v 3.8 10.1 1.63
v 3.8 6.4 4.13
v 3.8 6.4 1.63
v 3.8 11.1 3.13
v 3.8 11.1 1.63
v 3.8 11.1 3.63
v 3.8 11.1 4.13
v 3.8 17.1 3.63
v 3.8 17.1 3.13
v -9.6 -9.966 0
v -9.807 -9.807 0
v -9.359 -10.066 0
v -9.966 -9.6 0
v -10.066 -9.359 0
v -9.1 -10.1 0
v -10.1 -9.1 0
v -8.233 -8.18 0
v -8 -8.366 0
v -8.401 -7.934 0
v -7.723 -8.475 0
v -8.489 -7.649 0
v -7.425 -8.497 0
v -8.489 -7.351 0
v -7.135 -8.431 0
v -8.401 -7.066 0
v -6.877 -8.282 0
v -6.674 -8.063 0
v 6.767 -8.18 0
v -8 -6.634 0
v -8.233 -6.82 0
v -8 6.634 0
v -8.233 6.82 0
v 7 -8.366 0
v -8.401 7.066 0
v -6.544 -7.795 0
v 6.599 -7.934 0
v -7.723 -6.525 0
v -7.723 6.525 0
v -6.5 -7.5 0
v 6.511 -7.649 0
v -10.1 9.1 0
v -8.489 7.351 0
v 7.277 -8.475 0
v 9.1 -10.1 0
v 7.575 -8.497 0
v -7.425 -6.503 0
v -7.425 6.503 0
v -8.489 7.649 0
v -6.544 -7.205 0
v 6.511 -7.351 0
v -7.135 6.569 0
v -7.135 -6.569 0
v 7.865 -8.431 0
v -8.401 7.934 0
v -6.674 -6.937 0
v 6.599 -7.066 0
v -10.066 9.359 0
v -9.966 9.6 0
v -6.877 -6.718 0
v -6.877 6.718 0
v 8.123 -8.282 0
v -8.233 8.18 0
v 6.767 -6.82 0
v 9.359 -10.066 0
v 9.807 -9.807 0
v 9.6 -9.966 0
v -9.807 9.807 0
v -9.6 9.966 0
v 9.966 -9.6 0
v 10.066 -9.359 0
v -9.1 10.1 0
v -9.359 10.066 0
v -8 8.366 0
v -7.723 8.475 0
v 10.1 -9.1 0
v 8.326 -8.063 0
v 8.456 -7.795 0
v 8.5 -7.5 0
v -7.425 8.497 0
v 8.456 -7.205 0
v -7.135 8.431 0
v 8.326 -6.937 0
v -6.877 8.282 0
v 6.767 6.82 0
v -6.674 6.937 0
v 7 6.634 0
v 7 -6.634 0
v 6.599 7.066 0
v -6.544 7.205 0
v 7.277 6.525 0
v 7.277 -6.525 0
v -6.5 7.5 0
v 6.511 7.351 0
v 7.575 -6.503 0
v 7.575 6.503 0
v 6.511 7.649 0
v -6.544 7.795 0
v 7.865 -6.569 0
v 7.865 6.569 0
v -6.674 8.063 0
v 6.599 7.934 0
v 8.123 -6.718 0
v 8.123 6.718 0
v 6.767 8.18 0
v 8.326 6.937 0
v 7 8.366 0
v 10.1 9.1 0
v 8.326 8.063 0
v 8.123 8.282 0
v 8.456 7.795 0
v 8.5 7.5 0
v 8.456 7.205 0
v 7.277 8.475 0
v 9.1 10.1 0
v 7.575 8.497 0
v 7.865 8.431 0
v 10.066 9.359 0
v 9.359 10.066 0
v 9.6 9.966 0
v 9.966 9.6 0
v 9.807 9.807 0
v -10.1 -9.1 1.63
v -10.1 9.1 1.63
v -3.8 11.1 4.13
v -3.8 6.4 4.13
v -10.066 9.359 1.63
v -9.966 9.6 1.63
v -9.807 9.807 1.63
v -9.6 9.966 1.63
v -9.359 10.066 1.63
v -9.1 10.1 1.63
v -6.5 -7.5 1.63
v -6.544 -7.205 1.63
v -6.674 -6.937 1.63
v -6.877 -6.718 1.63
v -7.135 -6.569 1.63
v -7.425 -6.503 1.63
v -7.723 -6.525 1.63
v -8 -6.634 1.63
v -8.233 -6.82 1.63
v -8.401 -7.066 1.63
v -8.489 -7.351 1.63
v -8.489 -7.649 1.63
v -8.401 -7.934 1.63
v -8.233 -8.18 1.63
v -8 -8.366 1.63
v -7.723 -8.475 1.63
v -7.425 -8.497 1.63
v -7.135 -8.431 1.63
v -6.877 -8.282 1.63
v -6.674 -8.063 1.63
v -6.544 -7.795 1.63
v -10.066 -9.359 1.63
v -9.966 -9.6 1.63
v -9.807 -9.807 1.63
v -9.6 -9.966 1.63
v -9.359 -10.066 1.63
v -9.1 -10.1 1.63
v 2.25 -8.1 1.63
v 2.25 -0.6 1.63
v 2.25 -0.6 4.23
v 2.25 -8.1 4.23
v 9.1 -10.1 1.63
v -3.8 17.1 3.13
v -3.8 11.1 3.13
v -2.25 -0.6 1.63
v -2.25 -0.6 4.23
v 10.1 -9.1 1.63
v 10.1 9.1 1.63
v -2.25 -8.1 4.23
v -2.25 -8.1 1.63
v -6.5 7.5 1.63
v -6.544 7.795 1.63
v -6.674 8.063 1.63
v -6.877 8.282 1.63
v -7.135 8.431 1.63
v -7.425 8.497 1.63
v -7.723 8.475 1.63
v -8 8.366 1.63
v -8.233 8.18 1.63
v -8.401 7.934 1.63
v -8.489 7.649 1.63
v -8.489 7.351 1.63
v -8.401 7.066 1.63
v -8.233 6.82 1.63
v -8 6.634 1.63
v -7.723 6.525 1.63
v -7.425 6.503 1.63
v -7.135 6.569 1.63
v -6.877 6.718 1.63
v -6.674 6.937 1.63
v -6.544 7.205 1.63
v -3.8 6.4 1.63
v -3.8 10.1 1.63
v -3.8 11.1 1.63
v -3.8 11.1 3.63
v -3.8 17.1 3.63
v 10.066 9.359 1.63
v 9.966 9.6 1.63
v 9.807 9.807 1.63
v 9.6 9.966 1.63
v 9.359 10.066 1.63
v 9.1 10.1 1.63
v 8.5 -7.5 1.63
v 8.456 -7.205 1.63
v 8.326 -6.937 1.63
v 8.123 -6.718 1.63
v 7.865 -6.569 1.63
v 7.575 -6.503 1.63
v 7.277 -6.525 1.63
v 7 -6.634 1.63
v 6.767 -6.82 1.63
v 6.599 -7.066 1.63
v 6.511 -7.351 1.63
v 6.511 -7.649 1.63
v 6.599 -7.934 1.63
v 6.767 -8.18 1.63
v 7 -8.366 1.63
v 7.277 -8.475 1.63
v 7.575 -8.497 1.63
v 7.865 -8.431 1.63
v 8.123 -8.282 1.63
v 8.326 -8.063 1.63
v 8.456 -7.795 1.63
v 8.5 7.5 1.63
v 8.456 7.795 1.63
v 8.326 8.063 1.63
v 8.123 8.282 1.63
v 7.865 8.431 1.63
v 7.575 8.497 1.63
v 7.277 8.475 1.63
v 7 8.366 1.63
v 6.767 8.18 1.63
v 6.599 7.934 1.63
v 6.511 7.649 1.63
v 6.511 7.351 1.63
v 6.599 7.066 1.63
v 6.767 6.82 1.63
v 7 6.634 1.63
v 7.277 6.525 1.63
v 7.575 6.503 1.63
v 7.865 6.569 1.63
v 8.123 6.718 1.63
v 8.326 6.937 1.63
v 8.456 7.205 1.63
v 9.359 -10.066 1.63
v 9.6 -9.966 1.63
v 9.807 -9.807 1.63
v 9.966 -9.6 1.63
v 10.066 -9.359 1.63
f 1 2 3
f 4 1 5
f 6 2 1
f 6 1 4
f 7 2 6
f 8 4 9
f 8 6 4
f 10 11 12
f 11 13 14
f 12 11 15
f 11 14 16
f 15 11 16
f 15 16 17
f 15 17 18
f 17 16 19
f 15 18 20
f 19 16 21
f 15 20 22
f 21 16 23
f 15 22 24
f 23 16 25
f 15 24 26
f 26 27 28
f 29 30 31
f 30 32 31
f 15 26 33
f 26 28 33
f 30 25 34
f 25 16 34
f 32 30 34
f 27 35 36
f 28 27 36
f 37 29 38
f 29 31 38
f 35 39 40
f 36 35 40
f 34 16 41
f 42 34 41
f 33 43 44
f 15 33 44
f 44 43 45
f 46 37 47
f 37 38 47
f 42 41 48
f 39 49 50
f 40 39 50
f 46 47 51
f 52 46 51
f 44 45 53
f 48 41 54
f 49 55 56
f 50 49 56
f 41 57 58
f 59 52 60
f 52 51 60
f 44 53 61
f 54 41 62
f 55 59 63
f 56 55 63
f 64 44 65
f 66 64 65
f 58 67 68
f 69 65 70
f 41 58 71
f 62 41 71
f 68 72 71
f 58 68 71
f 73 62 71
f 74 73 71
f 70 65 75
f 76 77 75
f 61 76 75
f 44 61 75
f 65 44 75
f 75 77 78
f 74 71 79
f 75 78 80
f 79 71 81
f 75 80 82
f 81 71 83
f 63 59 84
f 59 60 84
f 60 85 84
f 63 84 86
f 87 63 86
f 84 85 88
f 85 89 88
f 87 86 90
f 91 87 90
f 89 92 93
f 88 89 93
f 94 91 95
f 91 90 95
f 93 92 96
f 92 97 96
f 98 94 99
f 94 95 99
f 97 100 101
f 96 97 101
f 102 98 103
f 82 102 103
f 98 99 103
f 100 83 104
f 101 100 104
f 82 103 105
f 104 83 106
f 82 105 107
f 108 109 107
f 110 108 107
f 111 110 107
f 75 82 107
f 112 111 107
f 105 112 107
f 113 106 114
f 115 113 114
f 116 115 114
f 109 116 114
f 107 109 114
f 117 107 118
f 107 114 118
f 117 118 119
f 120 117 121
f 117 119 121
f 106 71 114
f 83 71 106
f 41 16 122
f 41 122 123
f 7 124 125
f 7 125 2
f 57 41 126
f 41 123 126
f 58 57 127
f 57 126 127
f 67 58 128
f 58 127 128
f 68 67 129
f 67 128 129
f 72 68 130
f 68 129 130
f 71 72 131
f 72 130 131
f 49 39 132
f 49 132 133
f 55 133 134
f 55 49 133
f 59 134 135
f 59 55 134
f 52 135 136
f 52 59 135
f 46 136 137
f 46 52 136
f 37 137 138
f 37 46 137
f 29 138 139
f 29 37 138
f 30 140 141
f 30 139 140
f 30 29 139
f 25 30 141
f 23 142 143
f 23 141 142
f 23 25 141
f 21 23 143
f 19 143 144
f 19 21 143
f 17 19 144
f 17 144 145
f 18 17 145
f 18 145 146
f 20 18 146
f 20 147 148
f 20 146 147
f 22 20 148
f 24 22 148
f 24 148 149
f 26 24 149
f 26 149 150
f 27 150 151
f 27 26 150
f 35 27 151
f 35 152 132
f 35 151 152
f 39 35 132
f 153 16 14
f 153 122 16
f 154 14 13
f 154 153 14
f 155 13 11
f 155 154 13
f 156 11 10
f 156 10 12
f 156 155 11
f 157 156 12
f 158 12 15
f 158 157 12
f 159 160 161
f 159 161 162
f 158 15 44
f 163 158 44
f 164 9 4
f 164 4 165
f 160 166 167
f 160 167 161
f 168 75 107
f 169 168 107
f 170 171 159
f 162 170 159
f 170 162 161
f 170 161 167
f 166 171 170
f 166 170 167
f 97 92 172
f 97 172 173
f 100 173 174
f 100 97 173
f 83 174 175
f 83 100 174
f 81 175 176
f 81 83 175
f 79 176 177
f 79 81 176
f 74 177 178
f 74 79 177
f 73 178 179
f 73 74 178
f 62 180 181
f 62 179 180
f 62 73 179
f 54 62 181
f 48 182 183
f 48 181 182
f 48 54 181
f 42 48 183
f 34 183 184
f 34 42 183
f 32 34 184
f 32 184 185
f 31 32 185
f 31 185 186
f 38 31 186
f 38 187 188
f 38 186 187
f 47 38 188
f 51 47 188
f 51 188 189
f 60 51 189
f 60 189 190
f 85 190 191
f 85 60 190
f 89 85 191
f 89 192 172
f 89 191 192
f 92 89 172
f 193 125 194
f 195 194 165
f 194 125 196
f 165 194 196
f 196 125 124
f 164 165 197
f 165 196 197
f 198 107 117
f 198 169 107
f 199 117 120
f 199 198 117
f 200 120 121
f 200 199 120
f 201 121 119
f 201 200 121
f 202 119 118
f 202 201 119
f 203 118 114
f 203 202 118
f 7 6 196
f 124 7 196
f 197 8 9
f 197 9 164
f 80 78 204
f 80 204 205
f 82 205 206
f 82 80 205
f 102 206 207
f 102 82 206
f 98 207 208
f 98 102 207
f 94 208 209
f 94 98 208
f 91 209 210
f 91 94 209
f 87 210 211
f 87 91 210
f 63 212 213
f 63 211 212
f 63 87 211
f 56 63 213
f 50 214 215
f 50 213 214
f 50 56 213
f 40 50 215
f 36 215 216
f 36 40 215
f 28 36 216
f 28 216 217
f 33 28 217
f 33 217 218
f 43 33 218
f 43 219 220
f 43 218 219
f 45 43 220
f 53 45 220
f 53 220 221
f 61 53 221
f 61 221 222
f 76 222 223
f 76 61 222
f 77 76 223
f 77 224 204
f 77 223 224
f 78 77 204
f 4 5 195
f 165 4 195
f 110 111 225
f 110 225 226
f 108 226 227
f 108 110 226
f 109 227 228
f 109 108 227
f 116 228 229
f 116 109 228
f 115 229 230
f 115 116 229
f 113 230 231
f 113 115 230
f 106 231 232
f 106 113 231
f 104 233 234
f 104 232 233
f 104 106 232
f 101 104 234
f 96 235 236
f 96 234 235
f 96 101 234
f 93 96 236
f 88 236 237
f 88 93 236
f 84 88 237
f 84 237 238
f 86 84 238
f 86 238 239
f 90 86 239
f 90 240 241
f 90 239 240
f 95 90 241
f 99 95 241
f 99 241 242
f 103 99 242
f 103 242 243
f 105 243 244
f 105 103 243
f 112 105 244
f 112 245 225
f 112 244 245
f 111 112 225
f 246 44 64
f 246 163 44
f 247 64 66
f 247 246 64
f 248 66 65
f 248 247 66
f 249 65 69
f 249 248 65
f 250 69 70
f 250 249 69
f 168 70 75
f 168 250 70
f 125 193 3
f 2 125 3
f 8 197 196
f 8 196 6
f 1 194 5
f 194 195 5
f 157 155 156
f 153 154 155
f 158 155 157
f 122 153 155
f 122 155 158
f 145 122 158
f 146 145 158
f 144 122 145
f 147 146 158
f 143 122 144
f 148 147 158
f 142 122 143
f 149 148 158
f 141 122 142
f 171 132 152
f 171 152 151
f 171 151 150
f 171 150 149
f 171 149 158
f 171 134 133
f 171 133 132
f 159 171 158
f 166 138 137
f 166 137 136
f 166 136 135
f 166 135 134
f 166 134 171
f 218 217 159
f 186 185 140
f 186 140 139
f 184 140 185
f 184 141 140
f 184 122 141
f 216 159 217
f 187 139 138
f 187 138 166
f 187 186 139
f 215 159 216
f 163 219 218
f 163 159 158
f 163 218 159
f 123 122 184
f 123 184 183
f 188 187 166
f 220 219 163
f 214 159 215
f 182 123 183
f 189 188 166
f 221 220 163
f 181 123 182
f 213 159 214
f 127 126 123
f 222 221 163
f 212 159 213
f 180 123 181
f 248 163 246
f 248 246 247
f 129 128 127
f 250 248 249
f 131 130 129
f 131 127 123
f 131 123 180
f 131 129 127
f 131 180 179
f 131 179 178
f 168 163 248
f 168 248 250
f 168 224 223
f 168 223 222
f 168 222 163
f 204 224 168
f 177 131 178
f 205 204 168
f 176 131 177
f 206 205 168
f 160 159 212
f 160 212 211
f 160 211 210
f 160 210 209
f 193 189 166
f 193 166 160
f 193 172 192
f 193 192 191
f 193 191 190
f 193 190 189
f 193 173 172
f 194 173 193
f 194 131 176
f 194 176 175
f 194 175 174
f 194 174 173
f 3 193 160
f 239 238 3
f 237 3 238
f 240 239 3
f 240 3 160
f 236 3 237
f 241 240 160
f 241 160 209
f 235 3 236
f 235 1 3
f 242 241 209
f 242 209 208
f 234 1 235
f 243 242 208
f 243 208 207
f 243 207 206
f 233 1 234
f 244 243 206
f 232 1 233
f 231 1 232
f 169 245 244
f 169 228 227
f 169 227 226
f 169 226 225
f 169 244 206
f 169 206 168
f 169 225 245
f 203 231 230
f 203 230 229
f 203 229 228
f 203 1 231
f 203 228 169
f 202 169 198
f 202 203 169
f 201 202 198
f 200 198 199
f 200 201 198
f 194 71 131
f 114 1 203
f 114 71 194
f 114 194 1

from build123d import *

# Parameters (mm, degrees)
SKETCH_1_W               = 20.2
SKETCH_1_H               = 20.2
EXTRUDE_1_DEPTH          = 1.63
FILLET_1_R               = 1
CUT_EXTRUDE_1_DEPTH      = 5
CUT_EXTRUDE_1_DEPTH_BACK = 15.376261684
SKETCH_2_R               = 1
EXTRUDE_2_DEPTH          = 2.5
EXTRUDE_3_DEPTH          = 2.6
SKETCH_6_W               = 7.6
SKETCH_6_H               = 0.5
EXTRUDE_6_DEPTH          = 6
SKETCH_7_W               = 7.6
SKETCH_7_H               = 6
EXTRUDE_7_DEPTH          = 0.4
SKETCH_8_W               = 7.6
SKETCH_8_H               = 6
CUT_EXTRUDE_2_DEPTH      = 0.4
EXTRUDE_8_DEPTH          = 1.4
SKETCH_10_W              = 6.8
SKETCH_10_H              = 1.6
CUT_EXTRUDE_3_DEPTH      = 1.5


with BuildPart() as part:
    # 草图1 → 凸台-拉伸1 (new body)
    with BuildSketch(Plane.XY):
        Rectangle(SKETCH_1_W, SKETCH_1_H)
    extrude(amount=EXTRUDE_1_DEPTH)

    # 圆角1
    fillet_1_edges = [part.edges().sort_by_distance(p)[0] for p in [
        (10.1, -10.1, 0.815),
        (-10.1, -10.1, 0.815),
        (-10.1, 10.1, 0.815),
        (10.1, 10.1, 0.815),
    ]]
    fillet(fillet_1_edges, radius=FILLET_1_R)

    # 草图2 → 切除-拉伸1 (cut, two sides: drawn at the far end of the back side and taken through both)
    with BuildSketch(Plane.XY.offset(1.63).offset(-CUT_EXTRUDE_1_DEPTH_BACK)):
        with Locations((-7.5, 7.5)):
            Circle(SKETCH_2_R)
        with Locations((7.5, 7.5)):
            Circle(SKETCH_2_R)
        with Locations((7.5, -7.5)):
            Circle(SKETCH_2_R)
        with Locations((-7.5, -7.5)):
            Circle(SKETCH_2_R)
    extrude(amount=CUT_EXTRUDE_1_DEPTH + CUT_EXTRUDE_1_DEPTH_BACK, mode=Mode.SUBTRACT)

    # 草图3 → 凸台-拉伸2 (add)
    with BuildSketch(Plane.XY.offset(1.63)):
        Polygon((0, 6.4), (3.8, 6.4), (3.8, 11.1), (-3.8, 11.1), (-3.8, 6.4), align=None)
    extrude(amount=EXTRUDE_2_DEPTH)

    # 草图4 → 凸台-拉伸3 (add)
    with BuildSketch(Plane.XY.offset(1.63)):
        Polygon((0, -8.1), (-2.25, -8.1), (-2.25, -0.6), (2.25, -0.6), (2.25, -8.1), align=None)
    extrude(amount=EXTRUDE_3_DEPTH)

    # 草图6 → 凸台-拉伸6 (add)
    with BuildSketch(Plane(origin=(0, 11.1, 0), x_dir=(1, 0, 0), z_dir=(0, 1, 0))):
        with Locations((0, -3.78)):
            Rectangle(SKETCH_6_W, SKETCH_6_H)
    extrude(amount=EXTRUDE_6_DEPTH)

    # 草图7 → 凸台-拉伸7 (add)
    with BuildSketch(Plane(origin=(0, 0, 3.53), x_dir=(-1, 0, 0), z_dir=(0, 0, -1))):
        with Locations((0, 14.1)):
            Rectangle(SKETCH_7_W, SKETCH_7_H)
    extrude(amount=EXTRUDE_7_DEPTH)

    # 草图8 → 切除-拉伸2 (cut)
    with BuildSketch(Plane.XY.offset(4.03)):
        with Locations((0, 14.1)):
            Rectangle(SKETCH_8_W, SKETCH_8_H)
    extrude(amount=-CUT_EXTRUDE_2_DEPTH, mode=Mode.SUBTRACT)

    # 草图9 → 凸台-拉伸8 (add)
    with BuildSketch(Plane(origin=(0, 0, 0), x_dir=(-1, 0, 0), z_dir=(0, 0, -1))):
        Polygon((-3.4, 6.1), (0, 6.1), (3.4, 6.1), (3.4, 7.7), (-3.4, 7.7), align=None)
    extrude(amount=EXTRUDE_8_DEPTH)

    # 草图10 → 切除-拉伸3 (cut)
    with BuildSketch(Plane(origin=(6.414908285, 4.302749918, 0), x_dir=(1, 0, 0), z_dir=(0, 0, 1))):
        with Locations((-6.414908285, 2.597250082)):
            Rectangle(SKETCH_10_W, SKETCH_10_H)
    extrude(amount=-CUT_EXTRUDE_3_DEPTH, mode=Mode.SUBTRACT)


solid = part.part
